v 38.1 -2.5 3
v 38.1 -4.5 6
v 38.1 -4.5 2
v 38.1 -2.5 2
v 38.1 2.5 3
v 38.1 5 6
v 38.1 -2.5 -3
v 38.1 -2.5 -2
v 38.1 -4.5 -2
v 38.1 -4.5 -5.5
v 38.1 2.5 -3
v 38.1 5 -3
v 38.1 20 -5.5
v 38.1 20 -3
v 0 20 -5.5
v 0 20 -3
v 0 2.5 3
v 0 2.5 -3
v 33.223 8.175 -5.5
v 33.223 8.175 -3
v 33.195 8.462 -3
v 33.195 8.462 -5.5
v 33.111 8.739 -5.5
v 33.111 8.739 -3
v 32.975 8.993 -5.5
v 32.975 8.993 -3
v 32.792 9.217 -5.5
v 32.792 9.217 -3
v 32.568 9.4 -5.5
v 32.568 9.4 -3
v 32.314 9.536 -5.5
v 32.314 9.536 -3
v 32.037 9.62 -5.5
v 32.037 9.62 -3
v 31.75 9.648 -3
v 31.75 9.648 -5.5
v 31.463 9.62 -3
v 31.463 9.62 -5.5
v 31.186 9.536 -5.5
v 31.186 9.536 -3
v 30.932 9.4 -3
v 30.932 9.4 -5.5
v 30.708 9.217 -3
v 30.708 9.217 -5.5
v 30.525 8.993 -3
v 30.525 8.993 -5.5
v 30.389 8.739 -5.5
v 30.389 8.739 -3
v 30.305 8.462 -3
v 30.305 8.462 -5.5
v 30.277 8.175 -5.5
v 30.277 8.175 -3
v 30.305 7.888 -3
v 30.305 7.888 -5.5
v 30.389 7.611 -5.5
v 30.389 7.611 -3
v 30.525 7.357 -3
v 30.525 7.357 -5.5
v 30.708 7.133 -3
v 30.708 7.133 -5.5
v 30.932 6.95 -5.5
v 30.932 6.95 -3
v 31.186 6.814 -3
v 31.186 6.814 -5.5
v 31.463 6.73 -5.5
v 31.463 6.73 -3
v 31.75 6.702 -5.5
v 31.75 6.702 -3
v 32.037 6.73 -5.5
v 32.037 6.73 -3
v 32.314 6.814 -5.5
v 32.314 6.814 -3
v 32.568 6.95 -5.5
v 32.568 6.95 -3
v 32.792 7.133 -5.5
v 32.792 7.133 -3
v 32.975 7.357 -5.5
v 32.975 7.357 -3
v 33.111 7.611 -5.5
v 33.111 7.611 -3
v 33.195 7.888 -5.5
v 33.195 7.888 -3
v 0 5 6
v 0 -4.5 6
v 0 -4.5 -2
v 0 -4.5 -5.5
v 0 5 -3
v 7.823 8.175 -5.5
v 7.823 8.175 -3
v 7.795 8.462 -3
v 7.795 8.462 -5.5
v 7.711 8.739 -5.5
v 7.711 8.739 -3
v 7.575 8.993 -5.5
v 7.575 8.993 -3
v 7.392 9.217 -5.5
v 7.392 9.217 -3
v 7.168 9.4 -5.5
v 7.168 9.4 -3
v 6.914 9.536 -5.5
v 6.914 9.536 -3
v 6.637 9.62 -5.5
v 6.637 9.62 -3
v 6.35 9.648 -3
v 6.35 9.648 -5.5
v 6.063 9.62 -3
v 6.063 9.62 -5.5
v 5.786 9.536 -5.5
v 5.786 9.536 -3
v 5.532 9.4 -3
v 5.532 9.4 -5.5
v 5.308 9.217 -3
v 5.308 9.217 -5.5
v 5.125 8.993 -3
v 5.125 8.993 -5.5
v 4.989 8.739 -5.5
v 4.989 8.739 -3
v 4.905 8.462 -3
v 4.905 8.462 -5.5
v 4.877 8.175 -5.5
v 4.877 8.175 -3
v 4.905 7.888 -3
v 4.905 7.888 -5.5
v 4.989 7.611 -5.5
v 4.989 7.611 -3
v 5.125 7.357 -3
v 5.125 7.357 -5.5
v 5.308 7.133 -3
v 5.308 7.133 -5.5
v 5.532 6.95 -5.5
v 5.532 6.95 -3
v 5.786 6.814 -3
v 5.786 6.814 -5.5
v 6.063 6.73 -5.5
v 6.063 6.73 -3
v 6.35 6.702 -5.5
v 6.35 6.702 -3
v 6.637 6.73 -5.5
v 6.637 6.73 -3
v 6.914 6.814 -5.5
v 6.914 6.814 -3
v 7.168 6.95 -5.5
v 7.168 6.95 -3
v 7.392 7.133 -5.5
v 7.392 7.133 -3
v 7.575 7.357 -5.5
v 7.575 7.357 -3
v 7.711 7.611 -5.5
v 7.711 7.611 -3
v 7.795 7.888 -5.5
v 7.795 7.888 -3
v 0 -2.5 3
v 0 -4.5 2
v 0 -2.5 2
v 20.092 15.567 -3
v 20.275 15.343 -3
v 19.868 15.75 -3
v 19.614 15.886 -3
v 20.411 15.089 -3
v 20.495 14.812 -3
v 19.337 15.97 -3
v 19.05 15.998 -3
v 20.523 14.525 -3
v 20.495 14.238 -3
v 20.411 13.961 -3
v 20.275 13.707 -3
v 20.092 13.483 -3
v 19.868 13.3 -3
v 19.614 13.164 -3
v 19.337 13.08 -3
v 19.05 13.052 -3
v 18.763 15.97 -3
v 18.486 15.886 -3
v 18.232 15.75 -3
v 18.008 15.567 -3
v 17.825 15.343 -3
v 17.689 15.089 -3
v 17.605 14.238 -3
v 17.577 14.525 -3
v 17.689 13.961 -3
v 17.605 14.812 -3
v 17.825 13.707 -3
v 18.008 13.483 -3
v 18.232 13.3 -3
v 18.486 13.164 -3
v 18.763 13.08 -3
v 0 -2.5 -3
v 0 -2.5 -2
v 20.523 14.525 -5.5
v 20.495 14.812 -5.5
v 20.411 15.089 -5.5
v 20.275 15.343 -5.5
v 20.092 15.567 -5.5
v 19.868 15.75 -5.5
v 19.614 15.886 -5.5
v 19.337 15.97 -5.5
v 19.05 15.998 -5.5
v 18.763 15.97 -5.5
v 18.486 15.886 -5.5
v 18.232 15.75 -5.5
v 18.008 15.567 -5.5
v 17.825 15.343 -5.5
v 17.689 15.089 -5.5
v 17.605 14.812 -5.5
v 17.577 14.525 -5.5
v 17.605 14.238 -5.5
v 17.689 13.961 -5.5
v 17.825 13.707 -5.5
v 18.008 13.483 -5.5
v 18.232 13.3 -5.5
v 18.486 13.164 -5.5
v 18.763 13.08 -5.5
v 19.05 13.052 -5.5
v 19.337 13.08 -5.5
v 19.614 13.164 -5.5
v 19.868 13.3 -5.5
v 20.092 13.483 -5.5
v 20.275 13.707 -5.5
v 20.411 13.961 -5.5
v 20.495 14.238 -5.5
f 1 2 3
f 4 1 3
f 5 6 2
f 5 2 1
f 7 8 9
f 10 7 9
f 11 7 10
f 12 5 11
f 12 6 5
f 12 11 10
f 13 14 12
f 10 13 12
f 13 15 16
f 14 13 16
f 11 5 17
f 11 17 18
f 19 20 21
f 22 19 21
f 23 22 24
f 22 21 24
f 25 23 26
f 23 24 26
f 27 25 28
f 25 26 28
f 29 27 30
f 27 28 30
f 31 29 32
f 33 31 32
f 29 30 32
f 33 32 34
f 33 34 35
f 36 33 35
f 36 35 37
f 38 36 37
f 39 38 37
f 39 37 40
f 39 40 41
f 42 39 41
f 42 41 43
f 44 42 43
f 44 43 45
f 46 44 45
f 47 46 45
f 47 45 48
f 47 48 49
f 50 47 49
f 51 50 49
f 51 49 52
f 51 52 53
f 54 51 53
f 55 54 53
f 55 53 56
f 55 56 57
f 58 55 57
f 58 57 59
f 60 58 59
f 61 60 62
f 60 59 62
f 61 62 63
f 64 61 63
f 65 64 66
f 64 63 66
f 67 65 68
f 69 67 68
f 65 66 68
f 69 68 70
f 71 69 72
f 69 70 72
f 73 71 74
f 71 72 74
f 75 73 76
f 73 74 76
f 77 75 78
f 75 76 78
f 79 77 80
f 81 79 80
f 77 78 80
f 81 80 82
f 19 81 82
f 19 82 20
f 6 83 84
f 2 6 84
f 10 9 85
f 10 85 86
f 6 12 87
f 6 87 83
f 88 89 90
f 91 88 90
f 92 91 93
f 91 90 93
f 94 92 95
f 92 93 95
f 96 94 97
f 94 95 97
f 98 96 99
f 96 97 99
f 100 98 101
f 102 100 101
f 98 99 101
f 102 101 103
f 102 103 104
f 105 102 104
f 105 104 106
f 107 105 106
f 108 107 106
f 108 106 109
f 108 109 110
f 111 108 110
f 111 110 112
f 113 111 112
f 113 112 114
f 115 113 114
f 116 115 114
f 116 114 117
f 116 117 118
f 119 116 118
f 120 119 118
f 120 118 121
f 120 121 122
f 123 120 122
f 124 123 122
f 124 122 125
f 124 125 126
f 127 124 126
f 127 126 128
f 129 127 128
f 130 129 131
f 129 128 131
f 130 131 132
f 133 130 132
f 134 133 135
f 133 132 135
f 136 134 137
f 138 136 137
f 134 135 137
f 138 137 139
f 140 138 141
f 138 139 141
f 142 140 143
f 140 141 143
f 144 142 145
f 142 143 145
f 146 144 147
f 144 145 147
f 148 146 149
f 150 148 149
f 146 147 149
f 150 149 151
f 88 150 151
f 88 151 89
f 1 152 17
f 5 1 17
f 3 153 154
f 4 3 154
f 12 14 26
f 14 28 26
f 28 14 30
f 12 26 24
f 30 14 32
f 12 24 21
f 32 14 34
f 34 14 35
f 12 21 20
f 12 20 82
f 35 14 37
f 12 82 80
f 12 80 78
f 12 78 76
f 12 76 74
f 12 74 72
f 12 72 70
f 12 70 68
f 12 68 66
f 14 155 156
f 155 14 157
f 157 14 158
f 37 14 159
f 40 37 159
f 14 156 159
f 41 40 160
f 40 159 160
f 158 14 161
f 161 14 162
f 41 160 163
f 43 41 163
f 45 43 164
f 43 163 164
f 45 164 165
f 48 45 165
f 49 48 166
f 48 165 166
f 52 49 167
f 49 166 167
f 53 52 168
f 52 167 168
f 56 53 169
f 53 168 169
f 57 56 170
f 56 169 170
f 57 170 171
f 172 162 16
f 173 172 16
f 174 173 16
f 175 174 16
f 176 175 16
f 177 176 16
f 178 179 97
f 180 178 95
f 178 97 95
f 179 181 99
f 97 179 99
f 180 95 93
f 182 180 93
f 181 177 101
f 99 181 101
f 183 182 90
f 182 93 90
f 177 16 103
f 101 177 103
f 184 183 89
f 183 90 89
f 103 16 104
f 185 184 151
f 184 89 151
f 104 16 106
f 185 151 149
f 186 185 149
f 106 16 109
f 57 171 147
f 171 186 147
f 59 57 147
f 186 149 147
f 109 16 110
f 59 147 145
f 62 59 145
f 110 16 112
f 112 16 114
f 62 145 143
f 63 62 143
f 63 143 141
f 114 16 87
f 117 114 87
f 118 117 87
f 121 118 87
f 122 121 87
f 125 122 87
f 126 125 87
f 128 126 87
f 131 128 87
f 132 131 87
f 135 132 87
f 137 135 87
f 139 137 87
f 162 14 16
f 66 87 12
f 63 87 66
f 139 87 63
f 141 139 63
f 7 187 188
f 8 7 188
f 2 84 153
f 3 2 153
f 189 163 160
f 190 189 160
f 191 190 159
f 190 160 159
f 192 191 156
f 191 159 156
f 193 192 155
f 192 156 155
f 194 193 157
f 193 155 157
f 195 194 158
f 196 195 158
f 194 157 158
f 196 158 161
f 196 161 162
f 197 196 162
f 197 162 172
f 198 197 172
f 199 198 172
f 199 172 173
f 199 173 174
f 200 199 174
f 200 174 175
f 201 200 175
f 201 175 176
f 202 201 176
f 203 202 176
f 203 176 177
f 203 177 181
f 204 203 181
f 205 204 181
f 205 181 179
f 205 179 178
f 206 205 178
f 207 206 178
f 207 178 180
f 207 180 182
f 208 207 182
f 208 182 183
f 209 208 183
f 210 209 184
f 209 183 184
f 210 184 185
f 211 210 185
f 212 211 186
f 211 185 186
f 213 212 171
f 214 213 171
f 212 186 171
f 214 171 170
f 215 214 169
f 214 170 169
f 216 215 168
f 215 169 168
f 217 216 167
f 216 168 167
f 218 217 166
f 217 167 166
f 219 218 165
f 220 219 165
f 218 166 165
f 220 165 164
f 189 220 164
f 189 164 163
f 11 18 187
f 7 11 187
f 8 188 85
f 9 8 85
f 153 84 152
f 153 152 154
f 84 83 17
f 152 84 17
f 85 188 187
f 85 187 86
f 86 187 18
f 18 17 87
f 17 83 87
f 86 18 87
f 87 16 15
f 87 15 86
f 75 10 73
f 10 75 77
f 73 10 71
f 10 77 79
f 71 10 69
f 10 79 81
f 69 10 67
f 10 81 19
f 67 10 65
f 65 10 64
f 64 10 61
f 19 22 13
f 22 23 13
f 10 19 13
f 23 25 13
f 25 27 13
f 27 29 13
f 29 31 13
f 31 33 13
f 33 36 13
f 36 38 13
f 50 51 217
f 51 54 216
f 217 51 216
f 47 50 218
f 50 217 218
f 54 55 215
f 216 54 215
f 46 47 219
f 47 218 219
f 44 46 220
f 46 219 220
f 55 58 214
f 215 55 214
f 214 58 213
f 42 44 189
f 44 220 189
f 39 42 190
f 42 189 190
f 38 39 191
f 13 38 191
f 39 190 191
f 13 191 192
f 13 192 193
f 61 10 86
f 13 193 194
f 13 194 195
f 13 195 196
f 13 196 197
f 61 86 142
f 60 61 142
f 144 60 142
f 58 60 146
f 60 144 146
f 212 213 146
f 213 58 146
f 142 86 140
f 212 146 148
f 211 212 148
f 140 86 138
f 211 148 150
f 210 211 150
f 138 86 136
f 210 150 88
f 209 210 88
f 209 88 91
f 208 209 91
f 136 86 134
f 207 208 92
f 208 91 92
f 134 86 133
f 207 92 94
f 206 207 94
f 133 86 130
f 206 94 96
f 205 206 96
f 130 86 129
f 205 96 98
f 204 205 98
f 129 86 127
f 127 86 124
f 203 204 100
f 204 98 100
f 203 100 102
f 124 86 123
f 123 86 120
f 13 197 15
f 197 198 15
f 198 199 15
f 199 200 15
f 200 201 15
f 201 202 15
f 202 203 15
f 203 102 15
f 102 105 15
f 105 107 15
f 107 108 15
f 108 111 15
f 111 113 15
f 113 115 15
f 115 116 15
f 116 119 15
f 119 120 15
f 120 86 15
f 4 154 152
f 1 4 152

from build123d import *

# Parameters (mm, degrees)
BOSS_EXTRUDE1_DEPTH       = 38.1
F_4_CLEARANCE_HOLE1_D     = 2.9464
F_4_CLEARANCE_HOLE1_DEPTH = 6.35
F_4_CLEARANCE_HOLE1_TIP   = 0.885187864


with BuildPart() as part:
    # Sketch1 → Boss-Extrude1 (new body)
    with BuildSketch(Plane(origin=(0, 0, 0), x_dir=(0, 0, -1), z_dir=(1, 0, 0))):
        Polygon((-6, -4.5), (-2, -4.5), (-2, -2.5), (-3, -2.5), (-3, 2.5), (3, 2.5), (3, -2.5), (2, -2.5), (2, -4.5), (5.5, -4.5), (5.5, 4.583333333), (5.5, 20), (3, 20), (3, 5), (-6, 5), align=None)
    extrude(amount=BOSS_EXTRUDE1_DEPTH)

    # #4 Clearance Hole1
    with Locations(Plane(origin=(0, 0, -5.5), x_dir=(-1, 0, 0), z_dir=(0, 0, -1))):
        with Locations((-19.05, 14.525), (-31.75, 8.175), (-6.35, 8.175)):
            Hole(F_4_CLEARANCE_HOLE1_D / 2, depth=F_4_CLEARANCE_HOLE1_DEPTH)
            with Locations((0, 0, -(F_4_CLEARANCE_HOLE1_DEPTH + F_4_CLEARANCE_HOLE1_TIP / 2))):  # 118° drill point
                Cone(0, F_4_CLEARANCE_HOLE1_D / 2, F_4_CLEARANCE_HOLE1_TIP, mode=Mode.SUBTRACT)


solid = part.part
